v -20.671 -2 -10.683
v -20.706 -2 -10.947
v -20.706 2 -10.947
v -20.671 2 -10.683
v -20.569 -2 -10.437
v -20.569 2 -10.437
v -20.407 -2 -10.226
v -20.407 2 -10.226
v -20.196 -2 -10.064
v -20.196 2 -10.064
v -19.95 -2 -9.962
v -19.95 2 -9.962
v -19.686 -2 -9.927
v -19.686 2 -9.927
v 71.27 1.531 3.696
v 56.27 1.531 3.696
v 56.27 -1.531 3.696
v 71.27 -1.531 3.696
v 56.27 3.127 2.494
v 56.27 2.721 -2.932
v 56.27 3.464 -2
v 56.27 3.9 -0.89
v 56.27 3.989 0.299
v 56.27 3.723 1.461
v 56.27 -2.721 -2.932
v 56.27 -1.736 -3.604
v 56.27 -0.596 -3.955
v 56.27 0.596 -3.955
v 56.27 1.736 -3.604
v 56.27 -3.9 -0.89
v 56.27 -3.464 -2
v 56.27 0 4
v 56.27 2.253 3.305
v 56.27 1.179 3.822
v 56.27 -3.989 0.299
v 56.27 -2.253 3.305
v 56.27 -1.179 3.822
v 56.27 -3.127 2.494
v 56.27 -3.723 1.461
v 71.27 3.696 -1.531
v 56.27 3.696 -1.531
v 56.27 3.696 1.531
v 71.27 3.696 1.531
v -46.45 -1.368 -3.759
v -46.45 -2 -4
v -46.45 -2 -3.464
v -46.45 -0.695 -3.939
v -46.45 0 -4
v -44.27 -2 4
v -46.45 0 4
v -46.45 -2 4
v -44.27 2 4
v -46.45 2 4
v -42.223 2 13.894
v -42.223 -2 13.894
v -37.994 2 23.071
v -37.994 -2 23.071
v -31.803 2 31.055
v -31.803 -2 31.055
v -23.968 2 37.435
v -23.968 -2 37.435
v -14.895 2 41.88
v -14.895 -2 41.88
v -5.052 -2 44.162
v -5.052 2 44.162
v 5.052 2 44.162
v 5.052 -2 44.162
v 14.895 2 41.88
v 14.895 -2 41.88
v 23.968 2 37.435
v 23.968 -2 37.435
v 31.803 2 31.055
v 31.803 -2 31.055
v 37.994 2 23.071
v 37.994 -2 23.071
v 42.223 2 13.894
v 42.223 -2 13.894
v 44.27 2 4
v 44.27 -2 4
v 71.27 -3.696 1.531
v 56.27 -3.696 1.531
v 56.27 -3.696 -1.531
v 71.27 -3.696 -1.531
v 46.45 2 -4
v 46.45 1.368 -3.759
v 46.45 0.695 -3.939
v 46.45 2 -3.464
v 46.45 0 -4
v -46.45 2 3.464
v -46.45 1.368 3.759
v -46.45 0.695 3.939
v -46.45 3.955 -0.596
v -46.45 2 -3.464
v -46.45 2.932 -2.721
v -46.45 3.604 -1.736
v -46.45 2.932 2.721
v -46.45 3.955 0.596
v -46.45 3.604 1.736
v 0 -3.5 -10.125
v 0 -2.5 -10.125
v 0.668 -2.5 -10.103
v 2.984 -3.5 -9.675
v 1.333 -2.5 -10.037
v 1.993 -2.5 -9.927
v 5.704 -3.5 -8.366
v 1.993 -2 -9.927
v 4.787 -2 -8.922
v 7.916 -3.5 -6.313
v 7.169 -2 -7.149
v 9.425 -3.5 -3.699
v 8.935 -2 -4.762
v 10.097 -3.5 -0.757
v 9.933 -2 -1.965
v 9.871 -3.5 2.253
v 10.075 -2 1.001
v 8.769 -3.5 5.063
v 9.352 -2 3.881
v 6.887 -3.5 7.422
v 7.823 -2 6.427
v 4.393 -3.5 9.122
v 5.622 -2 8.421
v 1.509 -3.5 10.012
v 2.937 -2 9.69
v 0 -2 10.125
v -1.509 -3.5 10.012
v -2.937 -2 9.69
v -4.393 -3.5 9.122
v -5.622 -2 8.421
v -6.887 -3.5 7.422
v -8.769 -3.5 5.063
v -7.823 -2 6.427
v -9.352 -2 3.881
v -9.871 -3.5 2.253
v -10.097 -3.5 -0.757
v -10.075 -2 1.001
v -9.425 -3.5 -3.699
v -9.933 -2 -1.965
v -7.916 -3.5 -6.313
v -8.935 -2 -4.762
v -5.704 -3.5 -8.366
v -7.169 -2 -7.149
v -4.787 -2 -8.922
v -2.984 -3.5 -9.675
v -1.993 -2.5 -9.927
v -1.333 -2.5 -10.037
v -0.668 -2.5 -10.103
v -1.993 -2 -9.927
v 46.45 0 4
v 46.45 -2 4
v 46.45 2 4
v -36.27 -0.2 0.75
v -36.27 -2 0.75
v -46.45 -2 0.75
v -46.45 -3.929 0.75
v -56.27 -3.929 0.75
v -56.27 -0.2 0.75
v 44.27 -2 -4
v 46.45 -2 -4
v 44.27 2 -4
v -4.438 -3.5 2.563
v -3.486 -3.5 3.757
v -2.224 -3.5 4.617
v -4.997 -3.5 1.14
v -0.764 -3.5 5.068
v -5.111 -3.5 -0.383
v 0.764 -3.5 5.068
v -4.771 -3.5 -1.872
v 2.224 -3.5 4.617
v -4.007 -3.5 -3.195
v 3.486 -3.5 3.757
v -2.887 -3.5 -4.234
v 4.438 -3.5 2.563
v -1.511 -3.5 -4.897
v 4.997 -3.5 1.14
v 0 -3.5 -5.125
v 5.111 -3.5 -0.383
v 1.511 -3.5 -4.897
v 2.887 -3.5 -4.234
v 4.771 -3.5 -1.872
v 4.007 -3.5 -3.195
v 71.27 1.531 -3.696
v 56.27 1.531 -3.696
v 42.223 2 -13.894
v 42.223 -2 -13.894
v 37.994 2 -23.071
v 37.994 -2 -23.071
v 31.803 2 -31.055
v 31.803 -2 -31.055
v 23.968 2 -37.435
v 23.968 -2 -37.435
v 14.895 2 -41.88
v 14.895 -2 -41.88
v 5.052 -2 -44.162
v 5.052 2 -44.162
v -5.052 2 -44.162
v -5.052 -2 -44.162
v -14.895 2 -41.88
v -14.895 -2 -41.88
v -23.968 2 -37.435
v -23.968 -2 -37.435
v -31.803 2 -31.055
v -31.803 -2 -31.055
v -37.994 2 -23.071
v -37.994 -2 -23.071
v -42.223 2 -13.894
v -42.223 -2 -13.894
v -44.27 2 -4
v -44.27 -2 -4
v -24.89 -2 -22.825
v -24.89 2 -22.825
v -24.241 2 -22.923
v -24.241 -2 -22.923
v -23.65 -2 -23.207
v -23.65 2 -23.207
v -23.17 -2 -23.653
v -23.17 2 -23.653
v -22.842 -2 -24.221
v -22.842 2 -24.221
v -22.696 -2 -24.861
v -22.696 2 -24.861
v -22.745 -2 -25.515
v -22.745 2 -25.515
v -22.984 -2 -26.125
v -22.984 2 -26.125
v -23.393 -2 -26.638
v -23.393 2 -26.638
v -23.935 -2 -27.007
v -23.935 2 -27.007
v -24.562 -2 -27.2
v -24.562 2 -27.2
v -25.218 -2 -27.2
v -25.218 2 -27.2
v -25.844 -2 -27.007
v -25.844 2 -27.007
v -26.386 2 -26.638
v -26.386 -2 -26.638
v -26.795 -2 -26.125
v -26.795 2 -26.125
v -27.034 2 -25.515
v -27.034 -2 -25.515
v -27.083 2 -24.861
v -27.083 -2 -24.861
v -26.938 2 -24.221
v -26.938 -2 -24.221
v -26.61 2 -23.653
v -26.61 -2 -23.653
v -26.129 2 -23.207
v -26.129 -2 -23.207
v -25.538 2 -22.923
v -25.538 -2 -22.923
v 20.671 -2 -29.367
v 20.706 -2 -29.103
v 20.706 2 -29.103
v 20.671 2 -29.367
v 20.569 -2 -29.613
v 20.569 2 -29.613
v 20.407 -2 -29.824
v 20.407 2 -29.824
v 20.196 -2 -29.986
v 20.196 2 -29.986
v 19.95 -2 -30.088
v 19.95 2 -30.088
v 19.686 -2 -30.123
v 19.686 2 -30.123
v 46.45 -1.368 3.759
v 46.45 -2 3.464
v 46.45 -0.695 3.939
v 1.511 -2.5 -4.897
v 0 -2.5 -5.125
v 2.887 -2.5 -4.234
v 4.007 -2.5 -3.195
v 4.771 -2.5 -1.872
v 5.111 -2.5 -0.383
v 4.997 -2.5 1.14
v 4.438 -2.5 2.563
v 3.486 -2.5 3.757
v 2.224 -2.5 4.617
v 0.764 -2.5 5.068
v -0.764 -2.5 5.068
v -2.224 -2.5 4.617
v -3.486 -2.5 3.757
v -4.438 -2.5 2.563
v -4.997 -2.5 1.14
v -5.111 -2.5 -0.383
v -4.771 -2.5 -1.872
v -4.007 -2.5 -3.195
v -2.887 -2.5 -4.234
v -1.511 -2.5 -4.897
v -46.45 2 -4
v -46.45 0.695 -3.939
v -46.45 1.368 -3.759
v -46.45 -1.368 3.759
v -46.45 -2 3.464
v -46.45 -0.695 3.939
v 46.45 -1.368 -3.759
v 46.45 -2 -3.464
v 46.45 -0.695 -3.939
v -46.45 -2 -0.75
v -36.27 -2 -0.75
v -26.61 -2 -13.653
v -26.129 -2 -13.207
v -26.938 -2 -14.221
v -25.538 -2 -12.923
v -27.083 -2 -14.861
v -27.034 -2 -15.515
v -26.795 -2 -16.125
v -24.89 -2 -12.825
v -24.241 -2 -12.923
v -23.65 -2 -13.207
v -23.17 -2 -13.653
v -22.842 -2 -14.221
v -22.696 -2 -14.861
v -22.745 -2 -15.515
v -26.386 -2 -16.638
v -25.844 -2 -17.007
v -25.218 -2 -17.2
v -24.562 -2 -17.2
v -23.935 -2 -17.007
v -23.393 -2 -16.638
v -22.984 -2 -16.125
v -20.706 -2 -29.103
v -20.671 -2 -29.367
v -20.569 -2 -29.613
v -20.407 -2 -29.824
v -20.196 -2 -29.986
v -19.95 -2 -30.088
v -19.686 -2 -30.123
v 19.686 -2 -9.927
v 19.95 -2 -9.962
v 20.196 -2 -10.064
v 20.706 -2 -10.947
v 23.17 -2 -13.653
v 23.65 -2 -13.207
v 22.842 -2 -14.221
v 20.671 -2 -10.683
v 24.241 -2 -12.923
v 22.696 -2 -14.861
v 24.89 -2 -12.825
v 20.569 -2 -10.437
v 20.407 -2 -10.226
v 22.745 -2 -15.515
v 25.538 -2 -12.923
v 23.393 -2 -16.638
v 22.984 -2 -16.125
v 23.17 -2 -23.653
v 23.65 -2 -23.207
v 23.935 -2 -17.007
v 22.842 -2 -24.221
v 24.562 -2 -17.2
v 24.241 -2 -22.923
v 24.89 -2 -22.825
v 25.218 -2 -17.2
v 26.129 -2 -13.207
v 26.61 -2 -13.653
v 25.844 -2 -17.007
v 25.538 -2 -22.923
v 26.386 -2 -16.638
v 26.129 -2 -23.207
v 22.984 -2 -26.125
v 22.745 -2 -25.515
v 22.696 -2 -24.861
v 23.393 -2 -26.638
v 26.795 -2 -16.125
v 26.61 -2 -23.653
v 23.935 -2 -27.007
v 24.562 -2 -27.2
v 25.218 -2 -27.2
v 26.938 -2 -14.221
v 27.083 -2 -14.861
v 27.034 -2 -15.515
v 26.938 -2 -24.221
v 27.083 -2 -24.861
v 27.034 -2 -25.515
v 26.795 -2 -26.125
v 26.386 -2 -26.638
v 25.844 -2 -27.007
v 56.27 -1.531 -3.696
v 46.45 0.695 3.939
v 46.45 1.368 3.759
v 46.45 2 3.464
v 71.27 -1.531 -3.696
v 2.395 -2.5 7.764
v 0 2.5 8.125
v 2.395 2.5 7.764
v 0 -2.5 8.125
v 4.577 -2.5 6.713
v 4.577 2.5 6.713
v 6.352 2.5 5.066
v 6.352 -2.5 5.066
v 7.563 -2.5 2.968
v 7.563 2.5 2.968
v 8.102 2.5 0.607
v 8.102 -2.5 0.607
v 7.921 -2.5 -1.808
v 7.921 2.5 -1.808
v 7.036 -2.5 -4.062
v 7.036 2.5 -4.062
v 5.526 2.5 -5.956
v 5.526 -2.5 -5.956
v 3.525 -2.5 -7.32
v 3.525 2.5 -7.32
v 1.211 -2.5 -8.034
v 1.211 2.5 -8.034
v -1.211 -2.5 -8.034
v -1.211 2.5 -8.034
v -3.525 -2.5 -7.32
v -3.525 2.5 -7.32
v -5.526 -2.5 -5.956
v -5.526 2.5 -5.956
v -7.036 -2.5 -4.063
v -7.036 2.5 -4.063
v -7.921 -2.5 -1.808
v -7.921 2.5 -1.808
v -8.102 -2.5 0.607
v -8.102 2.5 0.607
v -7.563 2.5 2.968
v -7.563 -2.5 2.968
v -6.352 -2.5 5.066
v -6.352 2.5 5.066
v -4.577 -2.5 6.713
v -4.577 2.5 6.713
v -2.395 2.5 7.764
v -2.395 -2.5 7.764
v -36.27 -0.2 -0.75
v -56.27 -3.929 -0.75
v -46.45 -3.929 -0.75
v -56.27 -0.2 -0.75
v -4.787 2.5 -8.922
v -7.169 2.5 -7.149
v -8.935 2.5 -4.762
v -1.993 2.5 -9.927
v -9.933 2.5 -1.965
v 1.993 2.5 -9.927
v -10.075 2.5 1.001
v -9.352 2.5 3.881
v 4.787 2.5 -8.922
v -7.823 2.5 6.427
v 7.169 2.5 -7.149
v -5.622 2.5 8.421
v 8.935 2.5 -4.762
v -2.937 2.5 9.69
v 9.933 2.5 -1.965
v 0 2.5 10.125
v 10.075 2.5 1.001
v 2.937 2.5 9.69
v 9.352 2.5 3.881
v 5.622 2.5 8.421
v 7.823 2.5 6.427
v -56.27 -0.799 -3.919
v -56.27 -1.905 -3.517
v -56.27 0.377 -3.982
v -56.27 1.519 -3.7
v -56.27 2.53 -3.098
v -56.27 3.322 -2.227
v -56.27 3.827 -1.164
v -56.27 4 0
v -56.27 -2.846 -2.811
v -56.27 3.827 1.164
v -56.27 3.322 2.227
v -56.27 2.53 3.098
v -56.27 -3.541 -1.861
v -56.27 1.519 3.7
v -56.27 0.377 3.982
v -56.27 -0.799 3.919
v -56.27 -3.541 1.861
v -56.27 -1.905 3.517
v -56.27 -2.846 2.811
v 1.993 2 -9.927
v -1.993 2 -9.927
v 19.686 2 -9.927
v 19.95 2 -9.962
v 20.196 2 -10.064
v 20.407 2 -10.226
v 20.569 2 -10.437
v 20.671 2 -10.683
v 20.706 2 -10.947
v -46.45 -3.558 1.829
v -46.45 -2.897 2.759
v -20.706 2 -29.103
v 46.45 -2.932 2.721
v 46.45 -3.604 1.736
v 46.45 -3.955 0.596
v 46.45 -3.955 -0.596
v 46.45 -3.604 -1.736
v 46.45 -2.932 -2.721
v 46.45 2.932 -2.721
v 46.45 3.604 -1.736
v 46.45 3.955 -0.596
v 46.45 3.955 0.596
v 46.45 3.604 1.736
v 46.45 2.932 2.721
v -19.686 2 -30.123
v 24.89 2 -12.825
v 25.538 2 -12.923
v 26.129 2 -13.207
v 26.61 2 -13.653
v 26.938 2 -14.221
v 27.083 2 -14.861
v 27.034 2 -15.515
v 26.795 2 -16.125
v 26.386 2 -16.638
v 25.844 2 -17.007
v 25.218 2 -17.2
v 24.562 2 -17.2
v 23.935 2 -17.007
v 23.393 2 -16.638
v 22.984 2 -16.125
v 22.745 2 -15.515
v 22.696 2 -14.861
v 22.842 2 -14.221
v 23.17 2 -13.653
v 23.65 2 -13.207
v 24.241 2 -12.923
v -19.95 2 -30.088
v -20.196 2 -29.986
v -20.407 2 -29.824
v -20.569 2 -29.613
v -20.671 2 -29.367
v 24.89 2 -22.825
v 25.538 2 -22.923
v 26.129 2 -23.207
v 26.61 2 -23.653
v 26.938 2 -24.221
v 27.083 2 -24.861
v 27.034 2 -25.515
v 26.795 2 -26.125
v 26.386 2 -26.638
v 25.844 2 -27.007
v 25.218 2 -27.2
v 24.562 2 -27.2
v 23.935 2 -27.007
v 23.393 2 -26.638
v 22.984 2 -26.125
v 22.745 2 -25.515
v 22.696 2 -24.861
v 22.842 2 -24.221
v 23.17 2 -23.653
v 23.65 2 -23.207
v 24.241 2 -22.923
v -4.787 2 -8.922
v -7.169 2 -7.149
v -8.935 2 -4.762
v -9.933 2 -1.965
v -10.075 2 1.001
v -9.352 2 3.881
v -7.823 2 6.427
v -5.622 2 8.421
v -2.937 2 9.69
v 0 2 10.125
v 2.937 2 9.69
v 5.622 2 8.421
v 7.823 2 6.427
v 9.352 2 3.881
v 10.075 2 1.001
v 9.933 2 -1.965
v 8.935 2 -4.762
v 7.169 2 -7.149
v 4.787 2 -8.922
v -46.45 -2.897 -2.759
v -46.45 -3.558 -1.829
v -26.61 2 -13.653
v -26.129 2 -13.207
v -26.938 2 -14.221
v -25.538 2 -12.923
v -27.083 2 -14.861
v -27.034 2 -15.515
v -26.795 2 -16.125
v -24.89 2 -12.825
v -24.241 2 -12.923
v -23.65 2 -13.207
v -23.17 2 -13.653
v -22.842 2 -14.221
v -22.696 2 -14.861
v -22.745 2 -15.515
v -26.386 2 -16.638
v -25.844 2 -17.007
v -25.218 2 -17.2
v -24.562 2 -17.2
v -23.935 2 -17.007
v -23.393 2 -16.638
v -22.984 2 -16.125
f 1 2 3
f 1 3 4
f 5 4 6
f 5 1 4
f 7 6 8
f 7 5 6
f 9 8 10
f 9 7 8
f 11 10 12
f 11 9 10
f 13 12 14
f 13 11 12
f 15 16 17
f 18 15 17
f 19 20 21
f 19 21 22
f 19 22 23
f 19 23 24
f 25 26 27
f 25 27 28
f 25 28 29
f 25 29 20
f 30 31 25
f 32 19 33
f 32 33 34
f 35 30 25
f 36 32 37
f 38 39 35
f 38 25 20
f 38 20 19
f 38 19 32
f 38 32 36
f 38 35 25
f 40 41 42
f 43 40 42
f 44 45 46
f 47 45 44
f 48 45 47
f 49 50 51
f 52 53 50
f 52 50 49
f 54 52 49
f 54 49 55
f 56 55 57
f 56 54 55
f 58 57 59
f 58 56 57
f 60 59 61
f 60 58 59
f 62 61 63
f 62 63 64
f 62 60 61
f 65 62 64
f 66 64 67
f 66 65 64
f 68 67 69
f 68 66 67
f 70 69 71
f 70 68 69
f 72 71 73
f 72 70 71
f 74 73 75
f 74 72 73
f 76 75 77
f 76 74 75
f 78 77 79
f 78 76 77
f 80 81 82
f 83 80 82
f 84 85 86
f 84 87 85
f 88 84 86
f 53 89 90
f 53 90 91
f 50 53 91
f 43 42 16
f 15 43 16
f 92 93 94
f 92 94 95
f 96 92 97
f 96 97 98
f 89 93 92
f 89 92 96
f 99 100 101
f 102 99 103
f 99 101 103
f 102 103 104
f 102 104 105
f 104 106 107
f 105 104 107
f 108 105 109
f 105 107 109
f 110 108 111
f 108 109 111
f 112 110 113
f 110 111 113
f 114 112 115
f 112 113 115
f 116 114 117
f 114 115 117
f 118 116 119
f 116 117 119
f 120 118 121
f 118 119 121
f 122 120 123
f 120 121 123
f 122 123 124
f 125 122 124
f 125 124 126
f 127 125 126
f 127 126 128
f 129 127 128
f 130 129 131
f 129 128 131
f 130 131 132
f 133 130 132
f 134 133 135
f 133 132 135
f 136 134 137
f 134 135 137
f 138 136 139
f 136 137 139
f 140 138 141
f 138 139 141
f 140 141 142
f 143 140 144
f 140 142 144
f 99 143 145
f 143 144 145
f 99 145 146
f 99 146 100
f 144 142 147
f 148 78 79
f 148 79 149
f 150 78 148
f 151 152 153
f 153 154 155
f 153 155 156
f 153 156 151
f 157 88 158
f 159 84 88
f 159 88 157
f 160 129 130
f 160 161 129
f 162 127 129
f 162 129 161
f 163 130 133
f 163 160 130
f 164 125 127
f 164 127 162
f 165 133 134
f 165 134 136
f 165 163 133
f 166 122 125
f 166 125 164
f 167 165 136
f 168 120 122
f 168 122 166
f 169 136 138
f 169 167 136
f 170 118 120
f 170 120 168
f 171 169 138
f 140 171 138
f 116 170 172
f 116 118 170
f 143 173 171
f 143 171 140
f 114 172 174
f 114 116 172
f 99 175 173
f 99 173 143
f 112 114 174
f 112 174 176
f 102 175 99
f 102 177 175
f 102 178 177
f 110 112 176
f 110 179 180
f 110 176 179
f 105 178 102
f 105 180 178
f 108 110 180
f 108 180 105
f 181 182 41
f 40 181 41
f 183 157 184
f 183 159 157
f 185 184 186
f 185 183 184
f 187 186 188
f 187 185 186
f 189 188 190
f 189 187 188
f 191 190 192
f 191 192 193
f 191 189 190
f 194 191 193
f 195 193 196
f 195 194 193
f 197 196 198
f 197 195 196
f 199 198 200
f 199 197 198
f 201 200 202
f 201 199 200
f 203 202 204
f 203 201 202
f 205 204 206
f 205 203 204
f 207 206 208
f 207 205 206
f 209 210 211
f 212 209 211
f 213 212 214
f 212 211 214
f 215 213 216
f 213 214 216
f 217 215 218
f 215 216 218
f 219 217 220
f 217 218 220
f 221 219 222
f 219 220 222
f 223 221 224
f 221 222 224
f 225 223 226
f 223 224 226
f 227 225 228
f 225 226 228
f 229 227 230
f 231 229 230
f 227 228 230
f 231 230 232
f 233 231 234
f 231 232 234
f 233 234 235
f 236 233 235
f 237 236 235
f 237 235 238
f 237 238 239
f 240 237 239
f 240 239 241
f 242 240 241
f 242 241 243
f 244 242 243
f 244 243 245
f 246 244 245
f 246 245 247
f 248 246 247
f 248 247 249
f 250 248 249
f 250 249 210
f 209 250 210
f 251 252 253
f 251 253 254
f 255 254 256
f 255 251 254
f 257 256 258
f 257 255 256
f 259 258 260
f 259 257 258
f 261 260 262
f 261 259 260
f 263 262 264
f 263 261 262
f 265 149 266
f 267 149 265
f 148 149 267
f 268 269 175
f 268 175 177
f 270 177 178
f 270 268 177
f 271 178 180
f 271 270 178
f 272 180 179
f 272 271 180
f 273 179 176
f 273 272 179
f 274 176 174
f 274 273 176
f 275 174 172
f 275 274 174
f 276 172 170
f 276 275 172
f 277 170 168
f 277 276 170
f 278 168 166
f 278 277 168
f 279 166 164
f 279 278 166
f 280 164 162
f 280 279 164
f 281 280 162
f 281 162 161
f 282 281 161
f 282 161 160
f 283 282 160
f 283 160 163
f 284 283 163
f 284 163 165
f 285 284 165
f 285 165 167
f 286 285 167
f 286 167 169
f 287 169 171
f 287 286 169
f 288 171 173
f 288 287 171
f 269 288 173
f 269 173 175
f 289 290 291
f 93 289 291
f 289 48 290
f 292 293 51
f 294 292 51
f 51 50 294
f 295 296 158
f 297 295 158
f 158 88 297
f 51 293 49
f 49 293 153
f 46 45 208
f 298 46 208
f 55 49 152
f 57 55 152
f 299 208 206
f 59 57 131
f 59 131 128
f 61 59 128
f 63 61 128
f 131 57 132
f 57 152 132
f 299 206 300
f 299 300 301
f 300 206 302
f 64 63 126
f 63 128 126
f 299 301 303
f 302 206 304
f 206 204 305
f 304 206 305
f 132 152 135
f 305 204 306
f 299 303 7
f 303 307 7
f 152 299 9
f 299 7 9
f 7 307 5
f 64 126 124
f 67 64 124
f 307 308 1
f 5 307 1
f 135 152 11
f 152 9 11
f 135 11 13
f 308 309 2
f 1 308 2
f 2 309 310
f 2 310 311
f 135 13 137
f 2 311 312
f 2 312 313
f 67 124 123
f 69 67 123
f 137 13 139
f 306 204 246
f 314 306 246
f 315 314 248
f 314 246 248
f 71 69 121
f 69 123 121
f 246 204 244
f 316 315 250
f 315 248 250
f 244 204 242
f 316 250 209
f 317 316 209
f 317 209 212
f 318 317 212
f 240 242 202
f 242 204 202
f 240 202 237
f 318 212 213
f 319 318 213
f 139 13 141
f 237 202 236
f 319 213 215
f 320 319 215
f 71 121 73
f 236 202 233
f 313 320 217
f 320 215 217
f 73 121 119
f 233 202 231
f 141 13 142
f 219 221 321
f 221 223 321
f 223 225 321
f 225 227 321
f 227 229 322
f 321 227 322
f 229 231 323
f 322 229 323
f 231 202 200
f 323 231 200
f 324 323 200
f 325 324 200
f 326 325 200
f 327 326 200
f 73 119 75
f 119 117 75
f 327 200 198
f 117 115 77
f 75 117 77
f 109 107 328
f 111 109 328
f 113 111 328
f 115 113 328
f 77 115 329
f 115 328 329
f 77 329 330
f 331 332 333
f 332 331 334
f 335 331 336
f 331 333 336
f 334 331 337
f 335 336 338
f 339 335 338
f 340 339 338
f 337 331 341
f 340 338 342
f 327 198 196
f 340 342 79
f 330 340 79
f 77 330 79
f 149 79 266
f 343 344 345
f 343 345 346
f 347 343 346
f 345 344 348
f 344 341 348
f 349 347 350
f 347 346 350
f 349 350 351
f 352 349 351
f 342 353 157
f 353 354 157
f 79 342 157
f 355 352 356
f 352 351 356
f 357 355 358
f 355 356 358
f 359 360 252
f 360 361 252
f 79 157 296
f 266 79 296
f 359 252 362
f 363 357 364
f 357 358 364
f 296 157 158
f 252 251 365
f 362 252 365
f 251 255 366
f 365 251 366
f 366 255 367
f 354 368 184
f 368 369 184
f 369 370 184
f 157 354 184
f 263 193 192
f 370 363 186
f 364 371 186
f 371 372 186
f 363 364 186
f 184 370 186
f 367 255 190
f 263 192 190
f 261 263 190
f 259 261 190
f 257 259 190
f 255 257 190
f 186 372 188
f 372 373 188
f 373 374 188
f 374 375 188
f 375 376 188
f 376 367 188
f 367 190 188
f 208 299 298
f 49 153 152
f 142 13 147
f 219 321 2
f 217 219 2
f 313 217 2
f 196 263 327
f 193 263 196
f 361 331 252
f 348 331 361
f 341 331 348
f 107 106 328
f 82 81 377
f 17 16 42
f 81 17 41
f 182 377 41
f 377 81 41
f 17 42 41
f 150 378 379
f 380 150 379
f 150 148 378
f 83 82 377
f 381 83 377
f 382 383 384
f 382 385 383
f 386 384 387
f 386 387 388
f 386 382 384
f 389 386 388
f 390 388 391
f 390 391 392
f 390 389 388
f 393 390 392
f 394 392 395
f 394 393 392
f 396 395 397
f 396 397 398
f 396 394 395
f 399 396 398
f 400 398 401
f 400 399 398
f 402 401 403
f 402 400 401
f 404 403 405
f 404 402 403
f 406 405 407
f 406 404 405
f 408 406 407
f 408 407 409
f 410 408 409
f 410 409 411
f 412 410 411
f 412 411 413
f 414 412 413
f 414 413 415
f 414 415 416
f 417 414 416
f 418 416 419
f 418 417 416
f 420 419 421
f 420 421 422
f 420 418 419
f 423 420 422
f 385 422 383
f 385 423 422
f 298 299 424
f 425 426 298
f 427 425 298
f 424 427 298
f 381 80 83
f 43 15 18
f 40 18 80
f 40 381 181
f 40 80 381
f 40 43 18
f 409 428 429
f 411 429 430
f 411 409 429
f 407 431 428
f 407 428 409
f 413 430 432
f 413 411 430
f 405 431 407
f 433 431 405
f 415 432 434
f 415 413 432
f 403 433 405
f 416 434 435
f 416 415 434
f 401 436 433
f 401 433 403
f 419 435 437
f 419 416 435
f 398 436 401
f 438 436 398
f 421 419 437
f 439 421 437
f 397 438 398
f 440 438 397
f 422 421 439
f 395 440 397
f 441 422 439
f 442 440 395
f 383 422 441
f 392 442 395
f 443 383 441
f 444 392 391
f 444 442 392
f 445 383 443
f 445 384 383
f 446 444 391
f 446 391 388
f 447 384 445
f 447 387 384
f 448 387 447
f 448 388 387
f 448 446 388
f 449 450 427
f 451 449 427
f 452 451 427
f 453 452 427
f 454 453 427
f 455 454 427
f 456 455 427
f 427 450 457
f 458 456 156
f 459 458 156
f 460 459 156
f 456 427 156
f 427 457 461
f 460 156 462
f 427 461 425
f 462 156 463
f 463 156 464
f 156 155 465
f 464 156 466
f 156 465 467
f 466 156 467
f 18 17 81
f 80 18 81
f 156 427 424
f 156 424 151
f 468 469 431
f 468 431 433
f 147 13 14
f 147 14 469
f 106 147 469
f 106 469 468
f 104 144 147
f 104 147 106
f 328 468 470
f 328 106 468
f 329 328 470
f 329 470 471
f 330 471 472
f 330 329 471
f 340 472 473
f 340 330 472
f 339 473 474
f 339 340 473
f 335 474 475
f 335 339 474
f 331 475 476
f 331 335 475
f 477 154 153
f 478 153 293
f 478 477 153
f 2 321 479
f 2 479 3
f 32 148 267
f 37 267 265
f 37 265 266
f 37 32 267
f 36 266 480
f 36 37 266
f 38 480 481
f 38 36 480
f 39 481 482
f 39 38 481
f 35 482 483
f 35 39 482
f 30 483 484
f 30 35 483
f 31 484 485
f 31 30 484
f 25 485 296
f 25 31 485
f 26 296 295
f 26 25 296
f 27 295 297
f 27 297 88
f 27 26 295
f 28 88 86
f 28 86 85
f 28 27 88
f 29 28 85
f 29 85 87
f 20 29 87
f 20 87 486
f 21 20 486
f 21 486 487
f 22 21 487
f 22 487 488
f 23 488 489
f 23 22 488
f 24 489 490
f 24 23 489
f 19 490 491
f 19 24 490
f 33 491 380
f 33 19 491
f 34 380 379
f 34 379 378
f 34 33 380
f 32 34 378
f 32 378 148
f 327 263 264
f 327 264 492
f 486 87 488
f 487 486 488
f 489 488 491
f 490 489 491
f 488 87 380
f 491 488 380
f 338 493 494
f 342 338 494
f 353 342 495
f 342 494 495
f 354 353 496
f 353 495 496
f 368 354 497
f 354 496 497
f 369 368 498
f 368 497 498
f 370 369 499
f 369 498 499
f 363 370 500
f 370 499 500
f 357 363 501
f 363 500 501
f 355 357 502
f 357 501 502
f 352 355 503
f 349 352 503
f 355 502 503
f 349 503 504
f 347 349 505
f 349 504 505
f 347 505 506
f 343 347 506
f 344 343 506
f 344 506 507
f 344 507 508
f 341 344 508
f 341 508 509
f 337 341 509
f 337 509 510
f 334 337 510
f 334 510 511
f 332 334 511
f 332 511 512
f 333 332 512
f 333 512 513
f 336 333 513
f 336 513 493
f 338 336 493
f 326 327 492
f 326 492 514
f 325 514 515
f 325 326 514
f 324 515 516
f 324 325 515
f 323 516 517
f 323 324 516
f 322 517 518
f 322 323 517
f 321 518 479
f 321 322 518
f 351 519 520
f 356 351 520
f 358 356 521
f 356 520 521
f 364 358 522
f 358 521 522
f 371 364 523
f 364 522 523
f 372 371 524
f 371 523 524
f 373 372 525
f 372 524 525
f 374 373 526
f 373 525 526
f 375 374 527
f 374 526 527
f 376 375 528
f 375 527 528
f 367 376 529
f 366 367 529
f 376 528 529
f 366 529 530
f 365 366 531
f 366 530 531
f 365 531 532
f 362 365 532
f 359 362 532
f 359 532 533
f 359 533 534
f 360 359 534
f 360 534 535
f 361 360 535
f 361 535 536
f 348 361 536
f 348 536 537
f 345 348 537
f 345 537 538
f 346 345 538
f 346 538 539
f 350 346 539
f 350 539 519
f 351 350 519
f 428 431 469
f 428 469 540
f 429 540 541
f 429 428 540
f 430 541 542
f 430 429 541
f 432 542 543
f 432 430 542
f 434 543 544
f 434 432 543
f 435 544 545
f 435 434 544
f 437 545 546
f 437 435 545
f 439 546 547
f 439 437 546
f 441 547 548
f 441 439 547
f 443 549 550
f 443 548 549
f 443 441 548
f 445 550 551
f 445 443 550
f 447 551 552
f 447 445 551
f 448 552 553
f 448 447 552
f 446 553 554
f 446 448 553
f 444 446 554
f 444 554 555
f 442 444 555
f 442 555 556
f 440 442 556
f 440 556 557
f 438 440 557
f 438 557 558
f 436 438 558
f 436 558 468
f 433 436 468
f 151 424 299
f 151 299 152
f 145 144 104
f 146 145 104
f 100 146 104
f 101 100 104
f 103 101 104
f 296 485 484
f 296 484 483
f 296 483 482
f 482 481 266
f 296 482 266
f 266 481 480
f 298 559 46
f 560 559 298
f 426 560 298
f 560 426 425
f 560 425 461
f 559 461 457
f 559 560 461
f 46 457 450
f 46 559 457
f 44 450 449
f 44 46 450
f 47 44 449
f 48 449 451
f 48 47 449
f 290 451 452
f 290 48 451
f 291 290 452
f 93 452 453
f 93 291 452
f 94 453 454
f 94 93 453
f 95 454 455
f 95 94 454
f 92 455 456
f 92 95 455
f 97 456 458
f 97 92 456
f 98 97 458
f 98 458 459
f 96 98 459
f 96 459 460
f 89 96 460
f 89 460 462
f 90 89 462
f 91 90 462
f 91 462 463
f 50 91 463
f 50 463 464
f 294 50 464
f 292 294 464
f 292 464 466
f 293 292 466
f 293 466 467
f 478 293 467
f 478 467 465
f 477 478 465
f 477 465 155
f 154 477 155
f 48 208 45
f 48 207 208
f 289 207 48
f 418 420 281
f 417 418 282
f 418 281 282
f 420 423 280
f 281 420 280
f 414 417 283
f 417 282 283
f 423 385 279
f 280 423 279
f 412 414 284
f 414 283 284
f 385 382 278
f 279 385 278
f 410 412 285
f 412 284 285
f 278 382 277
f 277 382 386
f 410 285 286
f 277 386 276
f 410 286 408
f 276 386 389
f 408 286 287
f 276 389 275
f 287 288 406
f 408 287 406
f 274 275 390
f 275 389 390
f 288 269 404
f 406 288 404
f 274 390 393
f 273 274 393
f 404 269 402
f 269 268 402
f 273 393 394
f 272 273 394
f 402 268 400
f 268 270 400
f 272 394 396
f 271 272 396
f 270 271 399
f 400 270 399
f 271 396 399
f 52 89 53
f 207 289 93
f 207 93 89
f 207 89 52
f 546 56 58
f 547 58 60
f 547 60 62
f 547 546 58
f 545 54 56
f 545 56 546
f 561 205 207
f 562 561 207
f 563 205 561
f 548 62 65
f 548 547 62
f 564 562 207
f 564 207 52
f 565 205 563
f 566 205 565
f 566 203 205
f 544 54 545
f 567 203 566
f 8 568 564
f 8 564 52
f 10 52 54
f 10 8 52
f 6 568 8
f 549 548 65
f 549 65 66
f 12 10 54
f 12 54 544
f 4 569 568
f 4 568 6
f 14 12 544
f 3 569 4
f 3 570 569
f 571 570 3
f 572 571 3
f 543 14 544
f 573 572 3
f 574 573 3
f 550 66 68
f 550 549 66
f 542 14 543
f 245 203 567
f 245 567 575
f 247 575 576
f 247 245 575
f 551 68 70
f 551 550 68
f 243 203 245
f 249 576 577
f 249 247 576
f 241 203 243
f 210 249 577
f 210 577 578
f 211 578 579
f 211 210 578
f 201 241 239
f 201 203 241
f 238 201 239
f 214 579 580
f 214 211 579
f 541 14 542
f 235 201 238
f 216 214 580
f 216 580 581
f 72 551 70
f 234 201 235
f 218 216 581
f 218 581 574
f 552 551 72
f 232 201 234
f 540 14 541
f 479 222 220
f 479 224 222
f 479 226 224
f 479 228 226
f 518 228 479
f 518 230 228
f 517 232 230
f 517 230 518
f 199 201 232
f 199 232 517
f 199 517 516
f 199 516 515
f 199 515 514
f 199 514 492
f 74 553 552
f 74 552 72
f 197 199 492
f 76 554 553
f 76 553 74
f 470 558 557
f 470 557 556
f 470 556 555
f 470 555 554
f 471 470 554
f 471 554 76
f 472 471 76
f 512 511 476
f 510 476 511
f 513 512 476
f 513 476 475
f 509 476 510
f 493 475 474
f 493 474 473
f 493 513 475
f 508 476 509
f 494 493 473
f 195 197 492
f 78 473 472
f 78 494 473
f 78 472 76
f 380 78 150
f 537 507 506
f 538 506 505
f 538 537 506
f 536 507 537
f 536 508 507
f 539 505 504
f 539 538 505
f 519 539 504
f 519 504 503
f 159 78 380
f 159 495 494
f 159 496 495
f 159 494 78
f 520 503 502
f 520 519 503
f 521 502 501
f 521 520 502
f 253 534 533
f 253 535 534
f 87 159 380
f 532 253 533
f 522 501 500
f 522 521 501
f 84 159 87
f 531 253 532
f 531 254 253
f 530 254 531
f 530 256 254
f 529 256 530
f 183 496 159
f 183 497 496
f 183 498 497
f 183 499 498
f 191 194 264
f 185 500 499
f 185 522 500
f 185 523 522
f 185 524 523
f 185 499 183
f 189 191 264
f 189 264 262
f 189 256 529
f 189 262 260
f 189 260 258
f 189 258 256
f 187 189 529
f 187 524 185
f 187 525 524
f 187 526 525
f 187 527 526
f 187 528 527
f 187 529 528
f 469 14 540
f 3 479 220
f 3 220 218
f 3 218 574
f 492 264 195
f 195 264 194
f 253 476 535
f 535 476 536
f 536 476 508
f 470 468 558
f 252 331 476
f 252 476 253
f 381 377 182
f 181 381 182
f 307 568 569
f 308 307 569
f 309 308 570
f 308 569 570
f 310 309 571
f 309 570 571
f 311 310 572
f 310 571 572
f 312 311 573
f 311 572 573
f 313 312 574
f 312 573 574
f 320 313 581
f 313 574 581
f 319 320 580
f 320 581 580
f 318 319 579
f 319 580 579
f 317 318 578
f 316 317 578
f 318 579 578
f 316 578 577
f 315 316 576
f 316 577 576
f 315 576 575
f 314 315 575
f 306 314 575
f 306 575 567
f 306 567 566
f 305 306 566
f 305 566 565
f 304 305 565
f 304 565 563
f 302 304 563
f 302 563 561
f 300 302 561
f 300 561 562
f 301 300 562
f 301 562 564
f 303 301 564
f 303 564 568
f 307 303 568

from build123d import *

# Parameters (mm, degrees)
SKETCH1_R           = 10.125
BOSS_EXTRUDE1_DEPTH = 2
SKETCH1_6_W         = 9.819656651
SKETCH1_6_H         = 4
SKETCH1_7_R         = 10.125
SKETCH1_7_R_2       = 8.125
BOSS_EXTRUDE2_DEPTH = 2.5
CAVITY1_START       = -2.5
CAVITY1_DEPTH       = 5
SKETCH3_R           = 2.2
CUT_EXTRUDE1_DEPTH  = 72.95885463
SKETCH4_W           = 1.5
SKETCH4_H           = 3.8
CUT_EXTRUDE2_DEPTH  = 20
BOSS_EXTRUDE3_DEPTH = 15
SKETCH6_R           = 10.125
SKETCH6_R_2         = 5.125
BOSS_EXTRUDE4_DEPTH = 1


# Read off the part's stored shape, not the designer's step: Cavity1
with BuildPart() as part:
    # Sketch1 → Boss-Extrude1 (new, symmetric)
    with BuildSketch(Plane(origin=(0, 0, 0), x_dir=(1, 0, 0), z_dir=(0, 1, 0))):
        with BuildLine():
            Line((-44.269656651, 4), (-46.45, 4))
            Line((-46.45, 4), (-46.45, -4))
            Line((-46.45, -4), (-44.269656651, -4))
            ThreePointArc((-44.269656651, -4), (0, -44.45), (44.269656651, -4))
            Line((44.269656651, -4), (46.45, -4))
            Line((46.45, -4), (46.45, 4))
            Line((46.45, 4), (44.269656651, 4))
            ThreePointArc((44.269656651, 4), (0, 44.45), (-44.269656651, 4))
        make_face()
        with Locations(Location((0, 0, 0), (0, 0, 270))):
            Circle(SKETCH1_R, mode=Mode.SUBTRACT)
    extrude(amount=BOSS_EXTRUDE1_DEPTH, both=True)

    # Sketch1<6> → Revolve1 (revolve)
    with BuildSketch(Plane(origin=(0, 0, 0), x_dir=(1, 0, 0), z_dir=(0, 1, 0))):
        with Locations((-51.359828326, -2)):
            Rectangle(SKETCH1_6_W, SKETCH1_6_H)
        with Locations((51.359828326, -2)):
            Rectangle(SKETCH1_6_W, SKETCH1_6_H)
    revolve(axis=Axis((-76.43543075, 0, 0), (1, 0, 0)))

    # Sketch1<7> → Boss-Extrude2 (add, symmetric)
    with BuildSketch(Plane(origin=(0, 0, 0), x_dir=(1, 0, 0), z_dir=(0, 1, 0))):
        with Locations(Location((0, 0, 0), (0, 0, 270))):
            Circle(SKETCH1_7_R)
        with Locations(Location((0, 0, 0), (0, 0, 270))):
            Circle(SKETCH1_7_R_2, mode=Mode.SUBTRACT)
    extrude(amount=BOSS_EXTRUDE2_DEPTH, both=True)

    # Cavity1 outline → Cavity1 (cut)
    with BuildSketch(Plane(origin=(0, 0, 0), x_dir=(1, 0, 0), z_dir=(0, 1, 0)).offset(CAVITY1_START)):
        with BuildLine():
            Line((20.706, 10.947), (20.706, 29.103))
            ThreePointArc((20.706, 29.103), (20.407248917, 29.824248917), (19.686, 30.123))
            Line((19.686, 30.123), (-19.686, 30.123))
            ThreePointArc((-19.686, 30.123), (-20.407248917, 29.824248917), (-20.706, 29.103))
            Line((-20.706, 29.103), (-20.706, 10.947))
            ThreePointArc((-20.706, 10.947), (-20.407248917, 10.225751083), (-19.686, 9.927))
            Line((-19.686, 9.927), (19.686, 9.927))
            ThreePointArc((19.686, 9.927), (20.407248917, 10.225751083), (20.706, 10.947))
        make_face()
    extrude(amount=CAVITY1_DEPTH, mode=Mode.SUBTRACT)

    # Sketch3 → Cut-Extrude1 (cut, through all)
    with BuildSketch(Plane(origin=(0, 2, 0), x_dir=(1, 0, 0), z_dir=(0, 1, 0))):
        with Locations(Location((-24.889613301, 25.025, 0), (0, 0, 270))):
            Circle(SKETCH3_R)
        with Locations(Location((-24.889613301, 15.025, 0), (0, 0, 270))):
            Circle(SKETCH3_R)
        with Locations(Location((24.889613301, 15.025, 0), (0, 0, 270))):
            Circle(SKETCH3_R)
        with Locations(Location((24.889613301, 25.025, 0), (0, 0, 270))):
            Circle(SKETCH3_R)
    extrude(amount=-CUT_EXTRUDE1_DEPTH, mode=Mode.SUBTRACT)

    # Sketch4 → Cut-Extrude2 (cut)
    with BuildSketch(Plane.ZY.offset(56.269656651)):
        with Locations((0, -2.1)):
            Rectangle(SKETCH4_W, SKETCH4_H)
    extrude(amount=-CUT_EXTRUDE2_DEPTH, mode=Mode.SUBTRACT)

    # Sketch6 → Boss-Extrude4 (add)
    with BuildSketch(Plane.XZ.offset(2.5)):
        with Locations(Location((0, 0, 0), (0, 0, 270))):
            Circle(SKETCH6_R)
        with Locations(Location((0, 0, 0), (0, 0, 270))):
            Circle(SKETCH6_R_2, mode=Mode.SUBTRACT)
    extrude(amount=BOSS_EXTRUDE4_DEPTH)


with BuildPart() as body_2:
    # Sketch5 → Boss-Extrude3 (new body)
    with BuildSketch(Plane(origin=(56.269656651, 0, 0), x_dir=(0, 0, -1), z_dir=(1, 0, 0))):
        Polygon((3.69551813, 1.530733729), (1.530733729, 3.69551813), (-1.530733729, 3.69551813), (-3.69551813, 1.530733729), (-3.69551813, -1.530733729), (-1.530733729, -3.69551813), (1.530733729, -3.69551813), (3.69551813, -1.530733729), align=None)
    extrude(amount=BOSS_EXTRUDE3_DEPTH)


solid = Compound([part.part, body_2.part])
